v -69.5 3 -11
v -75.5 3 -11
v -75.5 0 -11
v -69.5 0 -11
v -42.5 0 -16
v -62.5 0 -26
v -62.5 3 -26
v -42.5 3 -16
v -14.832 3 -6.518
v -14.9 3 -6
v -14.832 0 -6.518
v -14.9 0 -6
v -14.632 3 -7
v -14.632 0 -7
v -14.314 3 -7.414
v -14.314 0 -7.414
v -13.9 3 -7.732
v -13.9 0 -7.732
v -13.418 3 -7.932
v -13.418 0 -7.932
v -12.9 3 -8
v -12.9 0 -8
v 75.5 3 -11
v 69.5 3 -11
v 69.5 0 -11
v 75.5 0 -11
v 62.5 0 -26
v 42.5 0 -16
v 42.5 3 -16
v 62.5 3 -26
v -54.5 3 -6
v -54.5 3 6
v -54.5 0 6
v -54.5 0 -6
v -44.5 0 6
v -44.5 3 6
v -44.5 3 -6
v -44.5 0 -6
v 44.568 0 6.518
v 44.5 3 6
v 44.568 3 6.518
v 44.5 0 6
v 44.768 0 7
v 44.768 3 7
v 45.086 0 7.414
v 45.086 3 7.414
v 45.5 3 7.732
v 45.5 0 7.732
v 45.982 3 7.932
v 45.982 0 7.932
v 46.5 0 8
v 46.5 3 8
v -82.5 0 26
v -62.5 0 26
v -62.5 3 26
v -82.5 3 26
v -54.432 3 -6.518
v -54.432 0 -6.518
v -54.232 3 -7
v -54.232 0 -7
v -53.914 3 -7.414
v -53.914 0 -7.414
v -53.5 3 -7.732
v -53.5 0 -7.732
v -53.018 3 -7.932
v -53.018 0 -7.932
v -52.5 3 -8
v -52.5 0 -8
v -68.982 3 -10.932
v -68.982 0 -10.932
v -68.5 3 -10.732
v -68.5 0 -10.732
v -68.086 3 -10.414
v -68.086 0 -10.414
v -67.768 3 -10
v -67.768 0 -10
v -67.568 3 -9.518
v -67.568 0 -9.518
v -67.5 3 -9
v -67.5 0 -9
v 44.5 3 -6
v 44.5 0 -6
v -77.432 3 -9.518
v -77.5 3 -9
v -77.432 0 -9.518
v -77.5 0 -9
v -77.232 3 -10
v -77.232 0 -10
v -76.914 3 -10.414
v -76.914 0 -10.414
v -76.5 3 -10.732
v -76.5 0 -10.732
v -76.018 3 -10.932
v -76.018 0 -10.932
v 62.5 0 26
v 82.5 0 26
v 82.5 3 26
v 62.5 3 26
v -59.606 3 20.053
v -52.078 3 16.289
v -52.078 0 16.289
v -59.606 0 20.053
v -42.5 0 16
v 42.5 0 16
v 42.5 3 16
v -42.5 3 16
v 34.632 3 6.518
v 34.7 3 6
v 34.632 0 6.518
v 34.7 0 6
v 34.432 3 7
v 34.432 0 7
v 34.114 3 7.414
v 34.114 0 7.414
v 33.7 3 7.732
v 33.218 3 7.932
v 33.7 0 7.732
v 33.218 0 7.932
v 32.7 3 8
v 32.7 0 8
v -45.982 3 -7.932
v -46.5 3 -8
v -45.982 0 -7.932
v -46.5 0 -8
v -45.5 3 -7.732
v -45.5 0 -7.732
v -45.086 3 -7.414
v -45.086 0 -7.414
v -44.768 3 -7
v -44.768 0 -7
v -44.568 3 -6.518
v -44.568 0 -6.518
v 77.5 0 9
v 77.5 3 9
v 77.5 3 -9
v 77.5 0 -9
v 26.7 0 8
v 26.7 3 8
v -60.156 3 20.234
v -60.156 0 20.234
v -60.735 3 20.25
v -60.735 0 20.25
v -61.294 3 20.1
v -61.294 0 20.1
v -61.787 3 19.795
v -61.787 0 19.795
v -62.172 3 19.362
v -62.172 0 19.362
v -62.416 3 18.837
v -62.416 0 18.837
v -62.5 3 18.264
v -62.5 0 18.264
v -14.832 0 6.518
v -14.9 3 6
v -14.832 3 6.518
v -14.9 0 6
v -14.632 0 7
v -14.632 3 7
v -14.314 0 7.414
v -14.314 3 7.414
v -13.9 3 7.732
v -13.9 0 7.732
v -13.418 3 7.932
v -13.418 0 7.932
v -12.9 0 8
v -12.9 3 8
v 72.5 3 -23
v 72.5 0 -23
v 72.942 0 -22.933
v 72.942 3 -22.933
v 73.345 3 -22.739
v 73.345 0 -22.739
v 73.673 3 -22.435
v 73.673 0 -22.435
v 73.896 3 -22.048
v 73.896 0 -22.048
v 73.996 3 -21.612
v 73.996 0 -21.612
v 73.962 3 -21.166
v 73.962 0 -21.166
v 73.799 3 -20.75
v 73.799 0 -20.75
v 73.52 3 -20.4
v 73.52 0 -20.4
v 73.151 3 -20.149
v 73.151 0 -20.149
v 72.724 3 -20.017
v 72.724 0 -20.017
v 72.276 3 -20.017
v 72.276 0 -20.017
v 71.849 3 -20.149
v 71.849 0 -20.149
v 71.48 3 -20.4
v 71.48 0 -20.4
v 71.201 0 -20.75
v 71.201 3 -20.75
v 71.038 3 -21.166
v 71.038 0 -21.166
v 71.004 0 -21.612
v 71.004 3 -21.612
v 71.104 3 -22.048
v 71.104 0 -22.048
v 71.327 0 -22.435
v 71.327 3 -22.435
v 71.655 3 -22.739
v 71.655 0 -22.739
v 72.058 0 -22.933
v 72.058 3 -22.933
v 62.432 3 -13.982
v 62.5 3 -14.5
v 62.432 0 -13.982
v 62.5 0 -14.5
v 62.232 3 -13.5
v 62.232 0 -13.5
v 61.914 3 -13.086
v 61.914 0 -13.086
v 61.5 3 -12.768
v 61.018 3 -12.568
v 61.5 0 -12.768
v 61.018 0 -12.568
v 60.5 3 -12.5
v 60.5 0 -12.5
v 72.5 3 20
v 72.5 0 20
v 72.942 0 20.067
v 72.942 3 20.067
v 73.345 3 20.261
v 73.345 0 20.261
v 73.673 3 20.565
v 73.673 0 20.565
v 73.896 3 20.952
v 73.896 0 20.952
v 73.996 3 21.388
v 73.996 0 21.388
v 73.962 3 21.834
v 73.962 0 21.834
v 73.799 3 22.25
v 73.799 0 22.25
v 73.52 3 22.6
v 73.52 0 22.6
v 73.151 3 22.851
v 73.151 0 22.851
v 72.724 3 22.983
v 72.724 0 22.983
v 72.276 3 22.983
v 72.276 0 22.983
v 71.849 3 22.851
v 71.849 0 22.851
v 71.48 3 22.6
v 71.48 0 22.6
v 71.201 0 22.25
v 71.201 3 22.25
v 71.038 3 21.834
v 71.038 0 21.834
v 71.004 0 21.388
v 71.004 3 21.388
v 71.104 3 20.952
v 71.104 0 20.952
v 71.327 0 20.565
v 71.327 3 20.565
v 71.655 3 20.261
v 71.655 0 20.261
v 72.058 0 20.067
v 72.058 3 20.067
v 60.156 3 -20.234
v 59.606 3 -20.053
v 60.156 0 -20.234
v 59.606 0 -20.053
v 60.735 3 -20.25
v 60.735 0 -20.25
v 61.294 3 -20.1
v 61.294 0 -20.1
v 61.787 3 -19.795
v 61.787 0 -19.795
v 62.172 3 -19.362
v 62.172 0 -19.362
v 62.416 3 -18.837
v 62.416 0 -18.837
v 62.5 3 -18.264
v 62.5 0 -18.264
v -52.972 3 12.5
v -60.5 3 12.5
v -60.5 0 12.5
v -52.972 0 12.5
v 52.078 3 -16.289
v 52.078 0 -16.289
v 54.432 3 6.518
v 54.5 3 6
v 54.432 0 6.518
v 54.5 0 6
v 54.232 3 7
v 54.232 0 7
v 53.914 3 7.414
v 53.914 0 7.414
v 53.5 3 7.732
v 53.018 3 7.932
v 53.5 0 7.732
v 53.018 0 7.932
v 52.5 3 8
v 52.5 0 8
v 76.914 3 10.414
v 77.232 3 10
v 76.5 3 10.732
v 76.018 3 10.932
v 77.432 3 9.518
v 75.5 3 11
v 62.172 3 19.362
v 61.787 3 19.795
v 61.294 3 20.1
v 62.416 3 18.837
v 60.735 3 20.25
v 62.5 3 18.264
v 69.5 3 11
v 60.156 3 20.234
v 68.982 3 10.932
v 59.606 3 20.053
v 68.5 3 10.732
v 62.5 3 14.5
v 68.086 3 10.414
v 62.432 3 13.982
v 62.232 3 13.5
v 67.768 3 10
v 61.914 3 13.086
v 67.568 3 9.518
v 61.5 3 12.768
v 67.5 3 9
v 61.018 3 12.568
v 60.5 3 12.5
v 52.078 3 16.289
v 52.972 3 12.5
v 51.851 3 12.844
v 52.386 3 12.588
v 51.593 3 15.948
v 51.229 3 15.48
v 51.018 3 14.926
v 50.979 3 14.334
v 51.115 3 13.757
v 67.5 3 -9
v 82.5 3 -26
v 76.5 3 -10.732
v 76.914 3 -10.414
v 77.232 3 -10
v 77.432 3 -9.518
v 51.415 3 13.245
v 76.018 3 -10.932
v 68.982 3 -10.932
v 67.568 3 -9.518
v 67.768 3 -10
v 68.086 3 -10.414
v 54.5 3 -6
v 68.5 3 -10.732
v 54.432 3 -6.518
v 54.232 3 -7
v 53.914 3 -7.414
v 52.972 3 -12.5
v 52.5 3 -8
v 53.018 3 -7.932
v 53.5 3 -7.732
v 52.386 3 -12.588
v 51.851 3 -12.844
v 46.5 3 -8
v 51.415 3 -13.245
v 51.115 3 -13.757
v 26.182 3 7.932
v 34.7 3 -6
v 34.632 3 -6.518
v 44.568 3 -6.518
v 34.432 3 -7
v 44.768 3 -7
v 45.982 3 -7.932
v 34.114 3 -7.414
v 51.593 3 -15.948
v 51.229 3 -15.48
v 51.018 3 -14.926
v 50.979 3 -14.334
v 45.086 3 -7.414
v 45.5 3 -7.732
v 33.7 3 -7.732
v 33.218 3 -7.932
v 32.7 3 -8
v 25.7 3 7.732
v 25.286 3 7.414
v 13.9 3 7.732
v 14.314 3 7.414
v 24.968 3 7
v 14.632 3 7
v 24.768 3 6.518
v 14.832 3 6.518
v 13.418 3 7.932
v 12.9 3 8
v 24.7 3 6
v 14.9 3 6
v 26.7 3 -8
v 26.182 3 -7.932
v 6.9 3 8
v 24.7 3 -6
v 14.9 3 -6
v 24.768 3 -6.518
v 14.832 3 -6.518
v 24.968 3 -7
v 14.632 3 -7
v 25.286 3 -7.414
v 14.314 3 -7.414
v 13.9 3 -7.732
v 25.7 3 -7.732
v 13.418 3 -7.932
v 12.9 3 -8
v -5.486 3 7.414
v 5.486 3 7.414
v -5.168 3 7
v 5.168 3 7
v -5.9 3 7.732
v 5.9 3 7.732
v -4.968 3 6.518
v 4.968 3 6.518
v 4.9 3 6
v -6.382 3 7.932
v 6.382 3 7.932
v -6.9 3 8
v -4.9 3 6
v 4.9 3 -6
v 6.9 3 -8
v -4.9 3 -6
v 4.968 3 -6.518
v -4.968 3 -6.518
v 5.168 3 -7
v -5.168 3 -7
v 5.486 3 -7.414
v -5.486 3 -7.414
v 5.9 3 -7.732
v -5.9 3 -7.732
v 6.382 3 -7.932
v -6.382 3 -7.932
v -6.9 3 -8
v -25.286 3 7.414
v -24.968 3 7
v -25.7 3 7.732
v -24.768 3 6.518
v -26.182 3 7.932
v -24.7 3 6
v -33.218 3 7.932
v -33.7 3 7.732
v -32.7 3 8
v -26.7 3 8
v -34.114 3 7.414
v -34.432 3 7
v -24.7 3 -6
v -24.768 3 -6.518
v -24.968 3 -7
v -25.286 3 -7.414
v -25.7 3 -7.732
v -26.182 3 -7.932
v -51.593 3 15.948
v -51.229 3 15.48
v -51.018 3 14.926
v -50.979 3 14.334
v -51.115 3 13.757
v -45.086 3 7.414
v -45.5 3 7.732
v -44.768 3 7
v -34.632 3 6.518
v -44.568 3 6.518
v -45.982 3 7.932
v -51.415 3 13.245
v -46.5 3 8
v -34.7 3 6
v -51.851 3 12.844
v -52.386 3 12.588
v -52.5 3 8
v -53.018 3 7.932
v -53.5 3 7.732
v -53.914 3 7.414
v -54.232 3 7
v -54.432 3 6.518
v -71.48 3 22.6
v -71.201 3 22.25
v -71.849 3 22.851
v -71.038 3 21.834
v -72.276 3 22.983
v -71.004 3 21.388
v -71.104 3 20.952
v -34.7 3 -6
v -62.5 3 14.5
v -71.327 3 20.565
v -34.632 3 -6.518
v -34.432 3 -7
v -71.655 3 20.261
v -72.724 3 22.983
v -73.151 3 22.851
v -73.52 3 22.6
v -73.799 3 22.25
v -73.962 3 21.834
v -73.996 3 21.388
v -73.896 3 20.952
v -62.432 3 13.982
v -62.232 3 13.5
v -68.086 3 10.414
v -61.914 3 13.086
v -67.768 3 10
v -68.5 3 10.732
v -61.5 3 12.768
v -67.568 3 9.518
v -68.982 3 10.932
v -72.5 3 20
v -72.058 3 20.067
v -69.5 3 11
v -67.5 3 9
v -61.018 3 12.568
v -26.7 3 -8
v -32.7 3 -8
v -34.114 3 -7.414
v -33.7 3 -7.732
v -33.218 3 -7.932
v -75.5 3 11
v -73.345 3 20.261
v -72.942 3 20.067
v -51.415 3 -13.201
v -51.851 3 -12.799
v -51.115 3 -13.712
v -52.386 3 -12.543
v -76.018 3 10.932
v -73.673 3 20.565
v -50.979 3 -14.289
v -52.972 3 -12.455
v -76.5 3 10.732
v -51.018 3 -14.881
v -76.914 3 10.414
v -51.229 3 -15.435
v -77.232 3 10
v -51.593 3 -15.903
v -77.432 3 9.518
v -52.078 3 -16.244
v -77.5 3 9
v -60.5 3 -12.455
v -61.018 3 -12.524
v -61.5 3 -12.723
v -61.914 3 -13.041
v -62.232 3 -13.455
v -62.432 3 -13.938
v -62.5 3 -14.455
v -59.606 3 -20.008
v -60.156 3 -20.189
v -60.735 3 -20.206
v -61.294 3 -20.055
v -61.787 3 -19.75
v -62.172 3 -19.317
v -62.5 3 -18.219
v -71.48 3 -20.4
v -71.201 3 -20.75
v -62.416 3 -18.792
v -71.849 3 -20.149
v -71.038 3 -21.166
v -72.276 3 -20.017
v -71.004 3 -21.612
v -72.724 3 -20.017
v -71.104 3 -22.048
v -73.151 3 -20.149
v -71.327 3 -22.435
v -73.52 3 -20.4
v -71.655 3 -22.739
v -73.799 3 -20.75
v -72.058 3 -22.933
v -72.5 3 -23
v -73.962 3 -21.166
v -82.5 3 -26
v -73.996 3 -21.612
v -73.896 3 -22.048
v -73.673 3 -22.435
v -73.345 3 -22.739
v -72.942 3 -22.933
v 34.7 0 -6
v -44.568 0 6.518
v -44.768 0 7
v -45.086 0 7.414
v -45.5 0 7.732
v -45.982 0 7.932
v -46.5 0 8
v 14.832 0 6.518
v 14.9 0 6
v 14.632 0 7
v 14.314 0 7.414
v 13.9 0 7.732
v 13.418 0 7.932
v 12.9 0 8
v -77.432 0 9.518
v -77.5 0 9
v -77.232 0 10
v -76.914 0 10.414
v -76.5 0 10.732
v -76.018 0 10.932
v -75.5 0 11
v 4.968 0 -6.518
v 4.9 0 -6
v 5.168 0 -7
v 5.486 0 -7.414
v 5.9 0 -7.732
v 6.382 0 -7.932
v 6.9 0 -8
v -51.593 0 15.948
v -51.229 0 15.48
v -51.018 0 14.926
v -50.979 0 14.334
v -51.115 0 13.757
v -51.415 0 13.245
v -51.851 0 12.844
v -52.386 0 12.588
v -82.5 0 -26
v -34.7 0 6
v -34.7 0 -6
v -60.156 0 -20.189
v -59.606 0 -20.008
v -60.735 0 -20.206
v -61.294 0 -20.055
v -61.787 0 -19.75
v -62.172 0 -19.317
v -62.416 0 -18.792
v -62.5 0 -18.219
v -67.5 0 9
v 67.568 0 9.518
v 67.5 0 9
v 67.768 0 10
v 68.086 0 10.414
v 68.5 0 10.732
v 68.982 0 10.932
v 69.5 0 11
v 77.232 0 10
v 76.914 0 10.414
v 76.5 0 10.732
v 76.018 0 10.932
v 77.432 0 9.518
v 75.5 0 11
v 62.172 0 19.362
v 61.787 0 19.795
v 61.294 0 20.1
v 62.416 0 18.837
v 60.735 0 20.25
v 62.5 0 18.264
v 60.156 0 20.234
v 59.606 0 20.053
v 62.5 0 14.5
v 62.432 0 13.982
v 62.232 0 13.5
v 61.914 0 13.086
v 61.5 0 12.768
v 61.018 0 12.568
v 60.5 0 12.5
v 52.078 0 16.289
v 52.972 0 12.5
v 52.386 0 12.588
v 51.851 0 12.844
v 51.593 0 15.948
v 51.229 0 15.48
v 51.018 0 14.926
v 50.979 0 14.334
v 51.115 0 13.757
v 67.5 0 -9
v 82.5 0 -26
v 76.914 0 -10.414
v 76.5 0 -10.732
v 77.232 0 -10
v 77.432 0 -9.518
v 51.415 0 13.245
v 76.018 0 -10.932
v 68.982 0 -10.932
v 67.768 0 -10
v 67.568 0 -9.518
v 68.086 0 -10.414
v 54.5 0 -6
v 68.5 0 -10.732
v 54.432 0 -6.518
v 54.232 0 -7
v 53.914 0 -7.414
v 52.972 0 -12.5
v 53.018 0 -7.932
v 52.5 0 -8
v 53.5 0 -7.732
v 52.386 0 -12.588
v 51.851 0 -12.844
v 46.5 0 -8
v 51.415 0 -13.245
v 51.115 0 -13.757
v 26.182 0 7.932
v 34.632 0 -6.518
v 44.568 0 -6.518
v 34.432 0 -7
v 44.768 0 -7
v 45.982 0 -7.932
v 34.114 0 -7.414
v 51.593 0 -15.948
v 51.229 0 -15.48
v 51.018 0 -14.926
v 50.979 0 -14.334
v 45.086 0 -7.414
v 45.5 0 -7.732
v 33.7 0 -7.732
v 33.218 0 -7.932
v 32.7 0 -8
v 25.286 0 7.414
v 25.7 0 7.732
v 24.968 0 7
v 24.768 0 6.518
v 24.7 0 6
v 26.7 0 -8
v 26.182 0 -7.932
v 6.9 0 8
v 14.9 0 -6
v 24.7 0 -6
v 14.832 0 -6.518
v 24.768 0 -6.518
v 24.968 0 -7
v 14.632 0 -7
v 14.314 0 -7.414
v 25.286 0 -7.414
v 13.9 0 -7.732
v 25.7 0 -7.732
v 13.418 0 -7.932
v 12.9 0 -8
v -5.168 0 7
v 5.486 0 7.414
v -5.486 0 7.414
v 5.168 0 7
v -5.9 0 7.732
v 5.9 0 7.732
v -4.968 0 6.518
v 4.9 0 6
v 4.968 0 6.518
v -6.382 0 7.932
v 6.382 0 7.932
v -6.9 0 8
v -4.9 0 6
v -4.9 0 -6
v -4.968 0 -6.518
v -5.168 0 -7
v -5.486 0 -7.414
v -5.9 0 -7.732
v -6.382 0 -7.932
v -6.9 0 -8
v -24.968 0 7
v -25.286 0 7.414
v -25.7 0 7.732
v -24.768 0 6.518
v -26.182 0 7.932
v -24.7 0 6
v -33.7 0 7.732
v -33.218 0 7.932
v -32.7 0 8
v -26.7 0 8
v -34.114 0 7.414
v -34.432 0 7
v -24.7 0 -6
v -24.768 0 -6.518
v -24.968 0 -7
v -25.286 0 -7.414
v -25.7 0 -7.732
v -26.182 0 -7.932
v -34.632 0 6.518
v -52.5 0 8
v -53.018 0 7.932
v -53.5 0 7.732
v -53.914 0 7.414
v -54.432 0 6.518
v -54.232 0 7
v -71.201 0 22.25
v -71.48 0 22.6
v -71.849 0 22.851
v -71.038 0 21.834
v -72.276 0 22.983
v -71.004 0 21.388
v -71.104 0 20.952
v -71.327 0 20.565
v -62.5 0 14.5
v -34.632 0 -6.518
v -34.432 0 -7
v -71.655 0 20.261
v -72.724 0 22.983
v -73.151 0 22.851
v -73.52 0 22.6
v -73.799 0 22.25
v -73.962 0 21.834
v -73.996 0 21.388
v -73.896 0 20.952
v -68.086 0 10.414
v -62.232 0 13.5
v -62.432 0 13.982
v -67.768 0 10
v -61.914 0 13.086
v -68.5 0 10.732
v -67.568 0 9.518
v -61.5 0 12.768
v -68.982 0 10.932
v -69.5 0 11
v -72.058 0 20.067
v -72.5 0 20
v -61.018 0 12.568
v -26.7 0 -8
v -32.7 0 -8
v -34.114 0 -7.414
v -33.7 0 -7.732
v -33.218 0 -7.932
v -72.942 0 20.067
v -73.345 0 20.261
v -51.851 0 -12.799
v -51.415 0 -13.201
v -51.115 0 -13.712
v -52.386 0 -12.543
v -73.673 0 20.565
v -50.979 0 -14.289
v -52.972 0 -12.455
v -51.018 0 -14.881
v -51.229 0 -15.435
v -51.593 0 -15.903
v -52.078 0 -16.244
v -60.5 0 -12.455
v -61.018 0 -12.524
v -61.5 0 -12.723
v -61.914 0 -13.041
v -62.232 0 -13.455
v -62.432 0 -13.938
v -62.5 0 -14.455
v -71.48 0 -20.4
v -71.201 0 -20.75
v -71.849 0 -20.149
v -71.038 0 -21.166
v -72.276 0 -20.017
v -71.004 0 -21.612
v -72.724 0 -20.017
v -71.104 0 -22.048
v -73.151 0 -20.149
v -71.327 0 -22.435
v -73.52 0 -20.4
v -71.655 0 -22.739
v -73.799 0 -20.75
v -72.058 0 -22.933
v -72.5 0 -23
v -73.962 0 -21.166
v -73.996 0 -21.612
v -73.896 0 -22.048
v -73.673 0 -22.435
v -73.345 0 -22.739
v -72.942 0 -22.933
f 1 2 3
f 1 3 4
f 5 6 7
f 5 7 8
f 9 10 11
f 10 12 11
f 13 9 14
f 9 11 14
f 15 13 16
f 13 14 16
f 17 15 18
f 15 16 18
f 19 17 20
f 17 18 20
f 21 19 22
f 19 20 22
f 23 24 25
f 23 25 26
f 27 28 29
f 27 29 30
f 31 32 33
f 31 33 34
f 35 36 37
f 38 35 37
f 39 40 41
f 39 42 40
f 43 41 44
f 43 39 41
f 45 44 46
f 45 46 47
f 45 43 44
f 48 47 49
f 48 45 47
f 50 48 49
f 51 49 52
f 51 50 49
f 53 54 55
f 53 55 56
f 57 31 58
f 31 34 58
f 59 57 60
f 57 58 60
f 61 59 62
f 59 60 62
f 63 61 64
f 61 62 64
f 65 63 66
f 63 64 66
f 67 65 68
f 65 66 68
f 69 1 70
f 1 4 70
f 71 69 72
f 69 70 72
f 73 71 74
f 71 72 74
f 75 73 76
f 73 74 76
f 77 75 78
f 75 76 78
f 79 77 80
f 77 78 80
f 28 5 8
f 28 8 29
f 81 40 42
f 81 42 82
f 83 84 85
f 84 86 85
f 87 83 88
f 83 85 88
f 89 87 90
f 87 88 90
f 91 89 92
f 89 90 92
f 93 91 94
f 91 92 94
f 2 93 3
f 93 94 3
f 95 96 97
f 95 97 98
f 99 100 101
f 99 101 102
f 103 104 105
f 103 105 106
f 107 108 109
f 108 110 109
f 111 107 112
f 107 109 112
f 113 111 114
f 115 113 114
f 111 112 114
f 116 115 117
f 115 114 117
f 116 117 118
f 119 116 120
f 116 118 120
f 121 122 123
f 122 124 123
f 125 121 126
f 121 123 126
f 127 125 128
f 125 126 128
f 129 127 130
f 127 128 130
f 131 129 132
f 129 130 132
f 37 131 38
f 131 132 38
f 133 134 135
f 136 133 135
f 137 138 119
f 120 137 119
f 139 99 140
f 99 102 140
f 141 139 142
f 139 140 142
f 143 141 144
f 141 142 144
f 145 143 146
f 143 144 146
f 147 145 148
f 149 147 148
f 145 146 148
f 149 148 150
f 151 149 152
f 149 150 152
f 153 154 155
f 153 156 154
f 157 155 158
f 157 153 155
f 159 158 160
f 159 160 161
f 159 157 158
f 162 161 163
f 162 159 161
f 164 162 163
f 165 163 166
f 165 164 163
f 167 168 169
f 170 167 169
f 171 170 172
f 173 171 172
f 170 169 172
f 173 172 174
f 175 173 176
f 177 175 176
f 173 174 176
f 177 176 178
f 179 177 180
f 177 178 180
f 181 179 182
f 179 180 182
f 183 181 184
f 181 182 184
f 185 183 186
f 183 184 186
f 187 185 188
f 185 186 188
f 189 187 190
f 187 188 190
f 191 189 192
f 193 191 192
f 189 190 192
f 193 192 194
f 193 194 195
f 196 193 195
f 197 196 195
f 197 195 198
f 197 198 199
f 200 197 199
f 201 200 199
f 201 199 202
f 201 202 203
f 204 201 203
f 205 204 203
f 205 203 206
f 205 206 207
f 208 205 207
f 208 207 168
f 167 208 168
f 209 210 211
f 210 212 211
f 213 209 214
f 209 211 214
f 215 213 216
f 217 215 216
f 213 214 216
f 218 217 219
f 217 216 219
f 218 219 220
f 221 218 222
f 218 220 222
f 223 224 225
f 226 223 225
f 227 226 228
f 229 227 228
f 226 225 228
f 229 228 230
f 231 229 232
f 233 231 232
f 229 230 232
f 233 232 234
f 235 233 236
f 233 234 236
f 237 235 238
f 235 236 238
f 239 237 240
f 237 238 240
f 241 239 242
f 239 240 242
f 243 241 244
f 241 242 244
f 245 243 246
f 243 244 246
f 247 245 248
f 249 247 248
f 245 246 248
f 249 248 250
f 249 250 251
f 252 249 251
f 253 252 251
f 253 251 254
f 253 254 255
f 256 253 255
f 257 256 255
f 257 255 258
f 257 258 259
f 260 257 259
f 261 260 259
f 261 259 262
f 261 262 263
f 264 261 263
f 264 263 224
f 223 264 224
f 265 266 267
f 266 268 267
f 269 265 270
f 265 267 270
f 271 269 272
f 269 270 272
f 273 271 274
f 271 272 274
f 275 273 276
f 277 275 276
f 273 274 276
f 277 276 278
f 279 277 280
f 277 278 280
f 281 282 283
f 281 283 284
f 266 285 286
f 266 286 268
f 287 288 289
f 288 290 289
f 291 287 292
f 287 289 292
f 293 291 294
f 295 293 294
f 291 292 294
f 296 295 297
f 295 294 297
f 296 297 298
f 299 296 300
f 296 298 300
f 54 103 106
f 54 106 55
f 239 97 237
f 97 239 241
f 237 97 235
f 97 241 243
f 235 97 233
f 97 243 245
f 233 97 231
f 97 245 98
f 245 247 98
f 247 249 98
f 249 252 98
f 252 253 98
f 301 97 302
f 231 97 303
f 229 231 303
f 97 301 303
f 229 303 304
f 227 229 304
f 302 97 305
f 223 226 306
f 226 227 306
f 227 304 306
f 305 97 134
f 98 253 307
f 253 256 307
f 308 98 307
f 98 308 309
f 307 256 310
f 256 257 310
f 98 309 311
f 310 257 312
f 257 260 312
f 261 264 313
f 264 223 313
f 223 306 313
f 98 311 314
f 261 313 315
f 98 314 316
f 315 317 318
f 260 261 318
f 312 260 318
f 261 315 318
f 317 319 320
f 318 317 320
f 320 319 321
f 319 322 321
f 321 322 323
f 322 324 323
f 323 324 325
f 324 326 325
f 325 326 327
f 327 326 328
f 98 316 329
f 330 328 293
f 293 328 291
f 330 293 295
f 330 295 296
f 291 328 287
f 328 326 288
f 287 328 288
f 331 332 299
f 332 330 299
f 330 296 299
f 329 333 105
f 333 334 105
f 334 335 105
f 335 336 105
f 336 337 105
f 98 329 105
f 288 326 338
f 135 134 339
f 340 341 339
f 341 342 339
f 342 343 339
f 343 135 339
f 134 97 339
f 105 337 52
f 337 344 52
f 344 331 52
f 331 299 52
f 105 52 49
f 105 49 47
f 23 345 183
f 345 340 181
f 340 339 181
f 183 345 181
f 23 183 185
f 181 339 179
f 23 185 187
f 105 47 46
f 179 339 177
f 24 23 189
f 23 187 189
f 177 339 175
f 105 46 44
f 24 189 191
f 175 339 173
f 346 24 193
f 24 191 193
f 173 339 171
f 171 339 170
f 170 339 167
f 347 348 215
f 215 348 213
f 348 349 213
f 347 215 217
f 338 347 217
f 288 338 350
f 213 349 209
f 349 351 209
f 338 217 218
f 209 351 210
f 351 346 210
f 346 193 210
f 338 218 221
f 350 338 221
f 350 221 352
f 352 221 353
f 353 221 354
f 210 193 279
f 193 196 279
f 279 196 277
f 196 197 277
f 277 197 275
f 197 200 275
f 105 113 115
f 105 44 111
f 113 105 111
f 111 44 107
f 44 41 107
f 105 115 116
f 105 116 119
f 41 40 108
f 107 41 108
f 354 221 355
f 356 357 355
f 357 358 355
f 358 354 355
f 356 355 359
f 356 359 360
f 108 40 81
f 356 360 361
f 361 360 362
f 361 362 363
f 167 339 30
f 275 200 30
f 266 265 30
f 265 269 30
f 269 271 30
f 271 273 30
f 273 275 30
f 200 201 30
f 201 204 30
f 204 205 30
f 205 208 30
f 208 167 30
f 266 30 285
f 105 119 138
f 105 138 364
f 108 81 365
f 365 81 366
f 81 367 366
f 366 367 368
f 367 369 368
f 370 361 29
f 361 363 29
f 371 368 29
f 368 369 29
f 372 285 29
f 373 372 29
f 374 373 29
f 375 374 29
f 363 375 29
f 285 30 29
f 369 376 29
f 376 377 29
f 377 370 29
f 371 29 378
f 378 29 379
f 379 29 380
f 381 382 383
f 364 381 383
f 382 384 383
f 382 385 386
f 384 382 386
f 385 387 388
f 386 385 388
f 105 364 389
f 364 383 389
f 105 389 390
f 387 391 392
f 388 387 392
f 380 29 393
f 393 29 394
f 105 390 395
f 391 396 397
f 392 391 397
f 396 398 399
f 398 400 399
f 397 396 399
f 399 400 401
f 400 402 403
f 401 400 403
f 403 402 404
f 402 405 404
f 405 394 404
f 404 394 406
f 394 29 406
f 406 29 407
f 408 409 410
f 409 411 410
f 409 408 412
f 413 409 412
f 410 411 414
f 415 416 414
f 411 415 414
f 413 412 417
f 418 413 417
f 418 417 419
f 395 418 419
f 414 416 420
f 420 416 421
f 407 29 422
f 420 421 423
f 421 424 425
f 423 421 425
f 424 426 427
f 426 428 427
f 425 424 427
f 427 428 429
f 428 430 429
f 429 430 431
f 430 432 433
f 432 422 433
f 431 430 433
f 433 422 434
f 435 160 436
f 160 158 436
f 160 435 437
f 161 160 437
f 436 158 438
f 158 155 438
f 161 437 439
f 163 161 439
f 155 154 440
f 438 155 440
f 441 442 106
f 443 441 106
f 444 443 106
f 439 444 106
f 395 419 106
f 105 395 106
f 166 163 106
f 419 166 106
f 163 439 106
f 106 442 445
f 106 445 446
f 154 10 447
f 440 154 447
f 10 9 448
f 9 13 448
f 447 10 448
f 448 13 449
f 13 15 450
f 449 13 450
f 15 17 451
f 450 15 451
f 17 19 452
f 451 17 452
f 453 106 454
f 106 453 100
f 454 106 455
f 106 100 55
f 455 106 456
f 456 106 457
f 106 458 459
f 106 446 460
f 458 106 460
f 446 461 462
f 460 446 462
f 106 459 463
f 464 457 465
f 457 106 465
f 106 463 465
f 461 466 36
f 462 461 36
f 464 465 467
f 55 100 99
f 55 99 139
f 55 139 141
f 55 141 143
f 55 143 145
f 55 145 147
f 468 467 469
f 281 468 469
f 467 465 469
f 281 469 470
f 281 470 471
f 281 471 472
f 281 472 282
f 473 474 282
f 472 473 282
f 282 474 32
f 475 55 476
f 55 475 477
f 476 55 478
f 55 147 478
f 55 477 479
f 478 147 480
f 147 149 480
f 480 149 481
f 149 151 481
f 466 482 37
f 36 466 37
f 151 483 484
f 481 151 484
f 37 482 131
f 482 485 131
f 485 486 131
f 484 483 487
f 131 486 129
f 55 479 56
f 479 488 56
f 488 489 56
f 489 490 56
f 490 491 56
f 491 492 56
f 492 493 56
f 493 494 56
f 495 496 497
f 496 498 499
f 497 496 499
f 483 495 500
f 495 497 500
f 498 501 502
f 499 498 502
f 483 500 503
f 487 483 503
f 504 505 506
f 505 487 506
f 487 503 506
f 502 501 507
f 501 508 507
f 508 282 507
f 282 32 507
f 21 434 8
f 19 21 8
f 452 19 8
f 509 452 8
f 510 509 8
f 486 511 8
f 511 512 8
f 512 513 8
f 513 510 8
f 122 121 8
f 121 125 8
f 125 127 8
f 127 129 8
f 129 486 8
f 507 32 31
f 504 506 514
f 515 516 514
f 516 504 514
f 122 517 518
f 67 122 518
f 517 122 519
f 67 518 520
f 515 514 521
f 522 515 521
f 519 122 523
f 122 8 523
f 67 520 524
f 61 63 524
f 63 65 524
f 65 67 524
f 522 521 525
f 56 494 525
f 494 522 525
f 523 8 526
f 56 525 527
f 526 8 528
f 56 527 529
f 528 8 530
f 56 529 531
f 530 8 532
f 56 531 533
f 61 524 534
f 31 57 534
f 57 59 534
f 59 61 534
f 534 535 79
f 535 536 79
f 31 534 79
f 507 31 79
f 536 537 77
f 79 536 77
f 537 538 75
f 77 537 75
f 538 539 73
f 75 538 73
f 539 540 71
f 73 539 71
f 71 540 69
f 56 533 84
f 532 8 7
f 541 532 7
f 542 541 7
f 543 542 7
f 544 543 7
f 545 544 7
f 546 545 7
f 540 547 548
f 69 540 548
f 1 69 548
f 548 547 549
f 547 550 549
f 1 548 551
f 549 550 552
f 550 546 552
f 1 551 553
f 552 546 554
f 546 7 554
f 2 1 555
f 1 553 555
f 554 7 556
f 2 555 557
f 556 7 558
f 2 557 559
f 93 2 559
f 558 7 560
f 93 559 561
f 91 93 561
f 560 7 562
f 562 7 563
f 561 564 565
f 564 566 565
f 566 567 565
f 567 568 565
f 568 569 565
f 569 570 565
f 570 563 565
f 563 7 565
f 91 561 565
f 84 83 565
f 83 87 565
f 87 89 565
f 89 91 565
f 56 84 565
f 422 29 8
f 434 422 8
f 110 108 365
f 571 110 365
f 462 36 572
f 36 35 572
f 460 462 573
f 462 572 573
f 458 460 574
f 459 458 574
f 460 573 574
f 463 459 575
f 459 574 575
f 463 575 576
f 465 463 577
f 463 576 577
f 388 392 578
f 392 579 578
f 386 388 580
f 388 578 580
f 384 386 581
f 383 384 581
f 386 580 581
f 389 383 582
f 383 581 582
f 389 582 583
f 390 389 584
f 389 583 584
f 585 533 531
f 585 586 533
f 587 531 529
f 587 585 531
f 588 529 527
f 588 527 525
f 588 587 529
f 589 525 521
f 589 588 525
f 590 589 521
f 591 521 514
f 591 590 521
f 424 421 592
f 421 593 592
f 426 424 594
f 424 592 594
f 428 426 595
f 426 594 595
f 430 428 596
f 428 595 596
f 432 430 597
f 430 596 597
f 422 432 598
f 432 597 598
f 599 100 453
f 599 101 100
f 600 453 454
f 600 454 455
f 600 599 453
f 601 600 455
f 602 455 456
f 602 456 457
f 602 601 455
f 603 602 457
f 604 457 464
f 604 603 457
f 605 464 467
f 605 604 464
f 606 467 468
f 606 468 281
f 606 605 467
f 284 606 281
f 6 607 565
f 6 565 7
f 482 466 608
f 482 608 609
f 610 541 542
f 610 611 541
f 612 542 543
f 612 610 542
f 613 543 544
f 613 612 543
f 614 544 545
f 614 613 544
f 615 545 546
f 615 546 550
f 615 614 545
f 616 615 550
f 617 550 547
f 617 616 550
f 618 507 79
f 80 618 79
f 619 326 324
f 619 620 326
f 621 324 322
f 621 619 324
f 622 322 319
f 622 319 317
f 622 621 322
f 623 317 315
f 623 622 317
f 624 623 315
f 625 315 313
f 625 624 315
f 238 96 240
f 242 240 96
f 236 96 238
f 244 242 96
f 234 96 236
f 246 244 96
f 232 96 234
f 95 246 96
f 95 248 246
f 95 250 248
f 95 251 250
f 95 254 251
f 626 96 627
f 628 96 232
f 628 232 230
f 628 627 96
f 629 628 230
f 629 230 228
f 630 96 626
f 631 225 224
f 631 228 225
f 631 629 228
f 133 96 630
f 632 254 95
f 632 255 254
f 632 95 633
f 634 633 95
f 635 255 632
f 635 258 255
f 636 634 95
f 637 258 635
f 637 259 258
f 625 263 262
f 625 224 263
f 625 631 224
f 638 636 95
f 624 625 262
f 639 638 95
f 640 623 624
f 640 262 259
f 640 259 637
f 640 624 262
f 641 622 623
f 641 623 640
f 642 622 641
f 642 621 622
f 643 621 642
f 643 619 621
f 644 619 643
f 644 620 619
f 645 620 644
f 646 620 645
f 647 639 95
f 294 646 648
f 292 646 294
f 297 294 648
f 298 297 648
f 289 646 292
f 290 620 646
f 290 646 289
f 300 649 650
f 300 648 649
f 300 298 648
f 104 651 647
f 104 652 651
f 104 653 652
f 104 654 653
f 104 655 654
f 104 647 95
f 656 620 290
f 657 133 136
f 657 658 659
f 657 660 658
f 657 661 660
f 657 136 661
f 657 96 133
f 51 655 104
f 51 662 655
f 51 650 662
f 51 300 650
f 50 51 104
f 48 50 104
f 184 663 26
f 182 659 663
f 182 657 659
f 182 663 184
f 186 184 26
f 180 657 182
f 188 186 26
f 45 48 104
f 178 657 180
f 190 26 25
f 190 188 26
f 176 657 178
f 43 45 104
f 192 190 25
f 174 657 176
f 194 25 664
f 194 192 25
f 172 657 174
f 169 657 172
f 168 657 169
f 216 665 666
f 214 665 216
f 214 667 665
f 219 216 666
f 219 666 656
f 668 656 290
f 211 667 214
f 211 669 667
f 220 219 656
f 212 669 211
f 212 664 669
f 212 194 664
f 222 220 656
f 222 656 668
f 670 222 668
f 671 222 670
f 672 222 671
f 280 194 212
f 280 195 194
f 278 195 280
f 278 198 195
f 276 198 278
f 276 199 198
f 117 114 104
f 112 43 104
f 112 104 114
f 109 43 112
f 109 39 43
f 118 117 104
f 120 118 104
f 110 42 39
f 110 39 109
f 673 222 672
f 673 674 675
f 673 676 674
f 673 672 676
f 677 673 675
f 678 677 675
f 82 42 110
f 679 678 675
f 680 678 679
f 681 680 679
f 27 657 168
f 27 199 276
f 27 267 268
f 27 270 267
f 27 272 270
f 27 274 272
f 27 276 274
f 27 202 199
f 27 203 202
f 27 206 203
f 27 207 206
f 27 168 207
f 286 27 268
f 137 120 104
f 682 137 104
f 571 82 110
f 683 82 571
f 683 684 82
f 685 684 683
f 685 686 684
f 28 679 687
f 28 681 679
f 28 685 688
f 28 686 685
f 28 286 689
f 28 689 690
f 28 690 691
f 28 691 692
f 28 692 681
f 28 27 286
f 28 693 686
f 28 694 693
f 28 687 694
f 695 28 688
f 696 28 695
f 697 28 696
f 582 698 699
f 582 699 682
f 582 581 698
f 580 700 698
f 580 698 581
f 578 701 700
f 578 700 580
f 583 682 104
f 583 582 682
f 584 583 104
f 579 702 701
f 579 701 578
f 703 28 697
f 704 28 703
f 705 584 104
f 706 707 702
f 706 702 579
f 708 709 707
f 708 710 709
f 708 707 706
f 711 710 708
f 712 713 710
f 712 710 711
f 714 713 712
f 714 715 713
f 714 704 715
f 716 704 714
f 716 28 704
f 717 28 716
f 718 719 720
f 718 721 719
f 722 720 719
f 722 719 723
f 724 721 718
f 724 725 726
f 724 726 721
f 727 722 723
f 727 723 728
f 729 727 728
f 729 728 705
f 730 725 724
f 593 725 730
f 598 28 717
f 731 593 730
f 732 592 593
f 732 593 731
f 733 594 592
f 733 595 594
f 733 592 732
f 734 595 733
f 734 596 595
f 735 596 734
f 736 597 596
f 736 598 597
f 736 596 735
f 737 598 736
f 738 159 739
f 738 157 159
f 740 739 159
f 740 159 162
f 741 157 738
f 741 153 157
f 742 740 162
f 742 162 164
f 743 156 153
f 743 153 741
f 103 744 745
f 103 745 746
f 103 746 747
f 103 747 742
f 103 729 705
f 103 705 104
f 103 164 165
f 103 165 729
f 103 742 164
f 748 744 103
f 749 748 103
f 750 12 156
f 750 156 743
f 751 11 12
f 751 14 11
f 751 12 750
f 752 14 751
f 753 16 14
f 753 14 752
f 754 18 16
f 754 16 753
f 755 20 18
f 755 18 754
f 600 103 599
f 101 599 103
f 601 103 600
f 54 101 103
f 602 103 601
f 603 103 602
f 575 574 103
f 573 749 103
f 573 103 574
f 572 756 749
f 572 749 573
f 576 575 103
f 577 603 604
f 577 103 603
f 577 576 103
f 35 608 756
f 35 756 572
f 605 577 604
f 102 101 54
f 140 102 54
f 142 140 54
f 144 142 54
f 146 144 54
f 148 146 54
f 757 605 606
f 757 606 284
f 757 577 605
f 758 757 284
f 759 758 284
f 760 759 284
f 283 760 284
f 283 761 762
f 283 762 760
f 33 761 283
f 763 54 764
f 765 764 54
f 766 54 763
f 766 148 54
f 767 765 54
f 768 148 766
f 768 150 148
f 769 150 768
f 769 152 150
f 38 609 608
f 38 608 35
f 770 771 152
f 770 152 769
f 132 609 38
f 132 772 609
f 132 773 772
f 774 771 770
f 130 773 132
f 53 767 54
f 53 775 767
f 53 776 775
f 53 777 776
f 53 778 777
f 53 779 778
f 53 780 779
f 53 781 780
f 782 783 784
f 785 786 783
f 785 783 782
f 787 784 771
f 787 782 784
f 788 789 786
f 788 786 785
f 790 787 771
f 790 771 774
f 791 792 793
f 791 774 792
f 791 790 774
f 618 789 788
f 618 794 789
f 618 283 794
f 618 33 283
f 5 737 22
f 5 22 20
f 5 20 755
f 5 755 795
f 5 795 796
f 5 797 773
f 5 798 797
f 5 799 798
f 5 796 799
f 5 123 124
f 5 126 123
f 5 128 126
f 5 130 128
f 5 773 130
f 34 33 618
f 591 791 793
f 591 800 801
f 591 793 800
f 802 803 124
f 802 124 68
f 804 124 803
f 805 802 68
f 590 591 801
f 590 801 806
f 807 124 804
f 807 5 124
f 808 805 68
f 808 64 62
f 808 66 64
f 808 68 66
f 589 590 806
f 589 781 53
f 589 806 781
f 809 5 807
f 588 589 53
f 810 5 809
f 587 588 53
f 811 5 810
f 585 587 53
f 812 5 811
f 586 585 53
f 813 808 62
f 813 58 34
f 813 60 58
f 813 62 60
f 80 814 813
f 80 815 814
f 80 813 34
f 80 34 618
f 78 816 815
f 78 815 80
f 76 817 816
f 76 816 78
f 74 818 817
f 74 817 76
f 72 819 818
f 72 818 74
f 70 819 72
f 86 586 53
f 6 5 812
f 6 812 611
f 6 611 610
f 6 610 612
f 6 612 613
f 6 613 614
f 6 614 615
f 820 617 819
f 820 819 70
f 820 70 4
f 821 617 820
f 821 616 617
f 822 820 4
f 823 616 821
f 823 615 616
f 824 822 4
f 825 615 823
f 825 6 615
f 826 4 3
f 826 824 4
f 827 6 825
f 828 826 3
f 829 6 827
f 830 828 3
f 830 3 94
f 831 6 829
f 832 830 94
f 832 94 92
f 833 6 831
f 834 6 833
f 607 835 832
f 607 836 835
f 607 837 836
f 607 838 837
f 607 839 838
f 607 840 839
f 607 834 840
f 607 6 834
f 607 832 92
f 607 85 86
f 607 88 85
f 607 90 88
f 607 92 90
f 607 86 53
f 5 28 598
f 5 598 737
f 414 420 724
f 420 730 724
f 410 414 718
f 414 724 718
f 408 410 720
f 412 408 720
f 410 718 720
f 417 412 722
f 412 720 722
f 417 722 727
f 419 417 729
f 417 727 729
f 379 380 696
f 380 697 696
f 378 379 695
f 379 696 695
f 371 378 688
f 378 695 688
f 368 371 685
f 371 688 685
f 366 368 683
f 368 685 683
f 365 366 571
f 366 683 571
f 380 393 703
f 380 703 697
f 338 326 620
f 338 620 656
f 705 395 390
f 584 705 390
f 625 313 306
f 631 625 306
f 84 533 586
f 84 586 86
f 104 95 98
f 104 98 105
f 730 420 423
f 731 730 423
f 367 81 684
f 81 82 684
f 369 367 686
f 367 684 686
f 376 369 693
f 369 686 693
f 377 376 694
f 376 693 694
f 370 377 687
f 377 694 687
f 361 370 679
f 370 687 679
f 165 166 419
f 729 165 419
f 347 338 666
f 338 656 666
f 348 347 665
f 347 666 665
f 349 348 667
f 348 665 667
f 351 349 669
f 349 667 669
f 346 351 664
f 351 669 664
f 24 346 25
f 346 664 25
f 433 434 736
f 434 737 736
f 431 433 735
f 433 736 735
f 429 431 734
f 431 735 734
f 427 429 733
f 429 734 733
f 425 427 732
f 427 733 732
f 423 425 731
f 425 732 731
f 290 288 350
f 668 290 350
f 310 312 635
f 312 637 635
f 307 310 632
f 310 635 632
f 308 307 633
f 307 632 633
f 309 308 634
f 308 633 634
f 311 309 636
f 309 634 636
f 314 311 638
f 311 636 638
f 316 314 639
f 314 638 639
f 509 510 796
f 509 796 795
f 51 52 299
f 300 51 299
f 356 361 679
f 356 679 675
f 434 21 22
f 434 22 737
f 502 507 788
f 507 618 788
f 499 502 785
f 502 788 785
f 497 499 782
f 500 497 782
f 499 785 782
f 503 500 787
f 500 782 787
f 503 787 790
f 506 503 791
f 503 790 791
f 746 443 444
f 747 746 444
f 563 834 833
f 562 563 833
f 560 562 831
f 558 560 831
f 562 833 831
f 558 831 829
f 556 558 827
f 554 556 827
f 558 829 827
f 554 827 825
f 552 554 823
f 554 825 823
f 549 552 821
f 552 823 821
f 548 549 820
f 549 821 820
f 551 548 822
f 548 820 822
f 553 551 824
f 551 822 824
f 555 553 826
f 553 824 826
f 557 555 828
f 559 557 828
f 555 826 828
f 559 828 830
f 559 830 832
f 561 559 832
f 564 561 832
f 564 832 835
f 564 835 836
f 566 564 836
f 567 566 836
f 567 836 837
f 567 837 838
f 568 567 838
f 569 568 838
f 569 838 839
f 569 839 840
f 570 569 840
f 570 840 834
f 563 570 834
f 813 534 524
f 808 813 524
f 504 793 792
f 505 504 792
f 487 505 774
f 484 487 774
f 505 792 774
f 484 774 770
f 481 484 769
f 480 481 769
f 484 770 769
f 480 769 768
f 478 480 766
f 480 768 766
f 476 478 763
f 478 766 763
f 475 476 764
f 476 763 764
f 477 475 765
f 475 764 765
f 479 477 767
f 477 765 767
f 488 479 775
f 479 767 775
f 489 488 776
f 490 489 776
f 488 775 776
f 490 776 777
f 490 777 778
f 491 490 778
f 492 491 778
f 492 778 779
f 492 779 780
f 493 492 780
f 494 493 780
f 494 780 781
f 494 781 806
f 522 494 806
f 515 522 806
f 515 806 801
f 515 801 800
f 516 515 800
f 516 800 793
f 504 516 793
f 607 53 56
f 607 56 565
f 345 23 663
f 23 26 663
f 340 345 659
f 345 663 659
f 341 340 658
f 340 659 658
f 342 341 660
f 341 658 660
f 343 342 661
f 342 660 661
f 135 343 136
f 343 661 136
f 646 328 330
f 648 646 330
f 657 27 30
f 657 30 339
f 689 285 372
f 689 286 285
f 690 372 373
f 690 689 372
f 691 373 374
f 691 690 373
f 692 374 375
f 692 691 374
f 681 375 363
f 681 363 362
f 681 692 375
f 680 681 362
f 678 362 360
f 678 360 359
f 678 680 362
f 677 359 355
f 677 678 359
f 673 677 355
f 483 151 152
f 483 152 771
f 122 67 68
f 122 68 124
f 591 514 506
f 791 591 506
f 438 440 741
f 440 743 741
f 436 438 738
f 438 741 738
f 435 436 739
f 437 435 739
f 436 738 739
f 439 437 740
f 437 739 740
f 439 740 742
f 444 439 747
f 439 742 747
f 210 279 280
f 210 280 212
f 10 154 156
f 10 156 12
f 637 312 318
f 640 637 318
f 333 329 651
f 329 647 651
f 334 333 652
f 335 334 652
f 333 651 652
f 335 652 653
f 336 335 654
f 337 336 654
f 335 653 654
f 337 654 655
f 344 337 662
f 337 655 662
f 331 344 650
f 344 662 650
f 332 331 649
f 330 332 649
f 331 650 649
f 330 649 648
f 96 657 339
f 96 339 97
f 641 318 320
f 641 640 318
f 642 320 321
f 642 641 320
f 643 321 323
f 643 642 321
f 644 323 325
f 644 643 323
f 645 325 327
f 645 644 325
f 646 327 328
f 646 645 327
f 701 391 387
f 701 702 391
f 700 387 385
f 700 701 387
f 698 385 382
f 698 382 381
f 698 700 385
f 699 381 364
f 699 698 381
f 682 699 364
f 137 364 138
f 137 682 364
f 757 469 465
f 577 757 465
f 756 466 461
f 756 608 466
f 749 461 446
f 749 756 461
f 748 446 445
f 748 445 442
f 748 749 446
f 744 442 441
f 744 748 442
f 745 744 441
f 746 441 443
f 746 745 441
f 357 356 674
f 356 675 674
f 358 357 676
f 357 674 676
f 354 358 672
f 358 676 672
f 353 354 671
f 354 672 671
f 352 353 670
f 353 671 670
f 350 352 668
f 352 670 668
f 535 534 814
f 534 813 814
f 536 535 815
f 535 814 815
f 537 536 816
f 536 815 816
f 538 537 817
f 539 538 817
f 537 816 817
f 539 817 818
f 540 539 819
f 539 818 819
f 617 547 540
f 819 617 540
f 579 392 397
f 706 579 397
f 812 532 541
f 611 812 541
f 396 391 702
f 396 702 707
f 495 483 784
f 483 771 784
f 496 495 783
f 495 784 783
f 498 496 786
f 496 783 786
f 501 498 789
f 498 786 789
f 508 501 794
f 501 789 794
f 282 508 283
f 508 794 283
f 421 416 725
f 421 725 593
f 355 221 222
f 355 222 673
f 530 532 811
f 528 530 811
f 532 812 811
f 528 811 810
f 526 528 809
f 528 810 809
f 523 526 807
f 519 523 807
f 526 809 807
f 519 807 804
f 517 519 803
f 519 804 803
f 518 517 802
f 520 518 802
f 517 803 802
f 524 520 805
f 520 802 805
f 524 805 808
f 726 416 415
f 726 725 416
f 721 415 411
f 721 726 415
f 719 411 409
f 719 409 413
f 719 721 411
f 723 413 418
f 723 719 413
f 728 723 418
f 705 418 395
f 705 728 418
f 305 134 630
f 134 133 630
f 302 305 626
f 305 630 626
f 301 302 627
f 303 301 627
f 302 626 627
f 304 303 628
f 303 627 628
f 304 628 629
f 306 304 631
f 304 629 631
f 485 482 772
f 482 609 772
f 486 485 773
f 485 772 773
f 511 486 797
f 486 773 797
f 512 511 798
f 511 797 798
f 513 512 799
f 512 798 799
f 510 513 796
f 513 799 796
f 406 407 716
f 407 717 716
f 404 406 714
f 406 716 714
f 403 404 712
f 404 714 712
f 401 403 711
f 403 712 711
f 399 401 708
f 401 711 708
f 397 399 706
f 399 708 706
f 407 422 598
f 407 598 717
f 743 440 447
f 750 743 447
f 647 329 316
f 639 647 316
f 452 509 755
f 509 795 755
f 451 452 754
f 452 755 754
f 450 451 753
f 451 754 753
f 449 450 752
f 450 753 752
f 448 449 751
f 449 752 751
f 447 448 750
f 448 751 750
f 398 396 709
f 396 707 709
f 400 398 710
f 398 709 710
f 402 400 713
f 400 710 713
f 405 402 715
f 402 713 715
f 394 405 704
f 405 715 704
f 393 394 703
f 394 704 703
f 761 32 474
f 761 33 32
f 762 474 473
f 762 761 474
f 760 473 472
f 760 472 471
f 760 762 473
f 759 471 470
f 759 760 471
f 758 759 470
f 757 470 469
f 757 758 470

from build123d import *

# Parameters (mm, degrees)
EXTRUDE_2_DEPTH       = 3
HOLE_WIZARD_3_0_3_6_D = 3
SKETCH_9_W            = 10
SKETCH_9_H            = 22
SKETCH_9_H_2          = 16
CUT_EXTRUDE_1_DEPTH   = 3
FILLET_1_R            = 2


with BuildPart() as part:
    # Sketch 1 → Extrude 2 (new body)
    with BuildSketch(Plane(origin=(0, 0, 0), x_dir=(1, 0, 0), z_dir=(0, 1, 0))):
        Polygon((-82.5, 26), (-62.5, 26), (-42.5, 16), (42.5, 16), (62.5, 26), (82.5, 26), (82.5, -26), (62.5, -26), (42.5, -16), (-42.5, -16), (-62.5, -26), (-82.5, -26), align=None)
    extrude(amount=EXTRUDE_2_DEPTH)

    # Hole Wizard 3.0 _3_ _6 (through all)
    with Locations(Plane(origin=(-72.5, 3, -21.5), x_dir=(0, 0, 1), z_dir=(0, 1, 0))):
        with Locations((0, 0), (0, 145), (43, 145), (43, 0)):
            Hole(HOLE_WIZARD_3_0_3_6_D / 2)

    # Sketch 9 → Cut-Extrude 1 (cut)
    with BuildSketch(Plane(origin=(0, 3, 0), x_dir=(1, 0, 0), z_dir=(0, 1, 0))):
        with Locations((-72.5, 0)):
            Rectangle(SKETCH_9_W, SKETCH_9_H)
        with Locations((72.5, 0)):
            Rectangle(SKETCH_9_W, SKETCH_9_H)
        Polygon((-62.5, 21.455387521), (-62.5, 12.455387521), (-44.5, 12.455387521), align=None)
        Polygon((44.5, 12.5), (62.5, 21.5), (62.5, 12.5), align=None)
        Polygon((62.5, -12.5), (44.5, -12.5), (62.5, -21.5), align=None)
        Polygon((-44.5, -12.5), (-62.5, -21.5), (-62.5, -12.5), align=None)
        with Locations((-49.5, 0)):
            Rectangle(SKETCH_9_W, SKETCH_9_H_2)
        with Locations((-29.7, 0)):
            Rectangle(SKETCH_9_W, SKETCH_9_H_2)
        with Locations((-9.9, 0)):
            Rectangle(SKETCH_9_W, SKETCH_9_H_2)
        with Locations((29.7, 0)):
            Rectangle(SKETCH_9_W, SKETCH_9_H_2)
        with Locations((49.5, 0)):
            Rectangle(SKETCH_9_W, SKETCH_9_H_2)
        with Locations((9.9, 0)):
            Rectangle(SKETCH_9_W, SKETCH_9_H_2)
    extrude(amount=-CUT_EXTRUDE_1_DEPTH, mode=Mode.SUBTRACT)

    # Fillet 1
    fillet_1_edges = [part.edges().sort_by_distance(p)[0] for p in [
        (-67.5, 1.5, -11),
        (-67.5, 1.5, 11),
        (-77.5, 1.5, 11),
        (-77.5, 1.5, -11),
        (14.9, 1.5, 8),
        (4.9, 1.5, 8),
        (4.9, 1.5, -8),
        (14.9, 1.5, -8),
        (34.7, 1.5, 8),
        (24.7, 1.5, 8),
        (24.7, 1.5, -8),
        (34.7, 1.5, -8),
        (54.5, 1.5, -8),
        (54.5, 1.5, 8),
        (44.5, 1.5, 8),
        (44.5, 1.5, -8),
        (62.5, 1.5, -12.5),
        (44.5, 1.5, -12.5),
        (62.5, 1.5, -21.5),
        (62.5, 1.5, 12.5),
        (62.5, 1.5, 21.5),
        (44.5, 1.5, 12.5),
        (-62.5, 1.5, -21.455387521),
        (-44.5, 1.5, -12.455387521),
        (-62.5, 1.5, -12.455387521),
        (77.5, 1.5, -11),
        (77.5, 1.5, 11),
        (67.5, 1.5, 11),
        (67.5, 1.5, -11),
        (-62.5, 1.5, 12.5),
        (-44.5, 1.5, 12.5),
        (-62.5, 1.5, 21.5),
        (-44.5, 1.5, -8),
        (-44.5, 1.5, 8),
        (-54.5, 1.5, 8),
        (-54.5, 1.5, -8),
        (-24.7, 1.5, 8),
        (-34.7, 1.5, 8),
        (-34.7, 1.5, -8),
        (-24.7, 1.5, -8),
        (-4.9, 1.5, 8),
        (-14.9, 1.5, 8),
        (-14.9, 1.5, -8),
        (-4.9, 1.5, -8),
    ]]
    fillet(fillet_1_edges, radius=FILLET_1_R)


solid = part.part
